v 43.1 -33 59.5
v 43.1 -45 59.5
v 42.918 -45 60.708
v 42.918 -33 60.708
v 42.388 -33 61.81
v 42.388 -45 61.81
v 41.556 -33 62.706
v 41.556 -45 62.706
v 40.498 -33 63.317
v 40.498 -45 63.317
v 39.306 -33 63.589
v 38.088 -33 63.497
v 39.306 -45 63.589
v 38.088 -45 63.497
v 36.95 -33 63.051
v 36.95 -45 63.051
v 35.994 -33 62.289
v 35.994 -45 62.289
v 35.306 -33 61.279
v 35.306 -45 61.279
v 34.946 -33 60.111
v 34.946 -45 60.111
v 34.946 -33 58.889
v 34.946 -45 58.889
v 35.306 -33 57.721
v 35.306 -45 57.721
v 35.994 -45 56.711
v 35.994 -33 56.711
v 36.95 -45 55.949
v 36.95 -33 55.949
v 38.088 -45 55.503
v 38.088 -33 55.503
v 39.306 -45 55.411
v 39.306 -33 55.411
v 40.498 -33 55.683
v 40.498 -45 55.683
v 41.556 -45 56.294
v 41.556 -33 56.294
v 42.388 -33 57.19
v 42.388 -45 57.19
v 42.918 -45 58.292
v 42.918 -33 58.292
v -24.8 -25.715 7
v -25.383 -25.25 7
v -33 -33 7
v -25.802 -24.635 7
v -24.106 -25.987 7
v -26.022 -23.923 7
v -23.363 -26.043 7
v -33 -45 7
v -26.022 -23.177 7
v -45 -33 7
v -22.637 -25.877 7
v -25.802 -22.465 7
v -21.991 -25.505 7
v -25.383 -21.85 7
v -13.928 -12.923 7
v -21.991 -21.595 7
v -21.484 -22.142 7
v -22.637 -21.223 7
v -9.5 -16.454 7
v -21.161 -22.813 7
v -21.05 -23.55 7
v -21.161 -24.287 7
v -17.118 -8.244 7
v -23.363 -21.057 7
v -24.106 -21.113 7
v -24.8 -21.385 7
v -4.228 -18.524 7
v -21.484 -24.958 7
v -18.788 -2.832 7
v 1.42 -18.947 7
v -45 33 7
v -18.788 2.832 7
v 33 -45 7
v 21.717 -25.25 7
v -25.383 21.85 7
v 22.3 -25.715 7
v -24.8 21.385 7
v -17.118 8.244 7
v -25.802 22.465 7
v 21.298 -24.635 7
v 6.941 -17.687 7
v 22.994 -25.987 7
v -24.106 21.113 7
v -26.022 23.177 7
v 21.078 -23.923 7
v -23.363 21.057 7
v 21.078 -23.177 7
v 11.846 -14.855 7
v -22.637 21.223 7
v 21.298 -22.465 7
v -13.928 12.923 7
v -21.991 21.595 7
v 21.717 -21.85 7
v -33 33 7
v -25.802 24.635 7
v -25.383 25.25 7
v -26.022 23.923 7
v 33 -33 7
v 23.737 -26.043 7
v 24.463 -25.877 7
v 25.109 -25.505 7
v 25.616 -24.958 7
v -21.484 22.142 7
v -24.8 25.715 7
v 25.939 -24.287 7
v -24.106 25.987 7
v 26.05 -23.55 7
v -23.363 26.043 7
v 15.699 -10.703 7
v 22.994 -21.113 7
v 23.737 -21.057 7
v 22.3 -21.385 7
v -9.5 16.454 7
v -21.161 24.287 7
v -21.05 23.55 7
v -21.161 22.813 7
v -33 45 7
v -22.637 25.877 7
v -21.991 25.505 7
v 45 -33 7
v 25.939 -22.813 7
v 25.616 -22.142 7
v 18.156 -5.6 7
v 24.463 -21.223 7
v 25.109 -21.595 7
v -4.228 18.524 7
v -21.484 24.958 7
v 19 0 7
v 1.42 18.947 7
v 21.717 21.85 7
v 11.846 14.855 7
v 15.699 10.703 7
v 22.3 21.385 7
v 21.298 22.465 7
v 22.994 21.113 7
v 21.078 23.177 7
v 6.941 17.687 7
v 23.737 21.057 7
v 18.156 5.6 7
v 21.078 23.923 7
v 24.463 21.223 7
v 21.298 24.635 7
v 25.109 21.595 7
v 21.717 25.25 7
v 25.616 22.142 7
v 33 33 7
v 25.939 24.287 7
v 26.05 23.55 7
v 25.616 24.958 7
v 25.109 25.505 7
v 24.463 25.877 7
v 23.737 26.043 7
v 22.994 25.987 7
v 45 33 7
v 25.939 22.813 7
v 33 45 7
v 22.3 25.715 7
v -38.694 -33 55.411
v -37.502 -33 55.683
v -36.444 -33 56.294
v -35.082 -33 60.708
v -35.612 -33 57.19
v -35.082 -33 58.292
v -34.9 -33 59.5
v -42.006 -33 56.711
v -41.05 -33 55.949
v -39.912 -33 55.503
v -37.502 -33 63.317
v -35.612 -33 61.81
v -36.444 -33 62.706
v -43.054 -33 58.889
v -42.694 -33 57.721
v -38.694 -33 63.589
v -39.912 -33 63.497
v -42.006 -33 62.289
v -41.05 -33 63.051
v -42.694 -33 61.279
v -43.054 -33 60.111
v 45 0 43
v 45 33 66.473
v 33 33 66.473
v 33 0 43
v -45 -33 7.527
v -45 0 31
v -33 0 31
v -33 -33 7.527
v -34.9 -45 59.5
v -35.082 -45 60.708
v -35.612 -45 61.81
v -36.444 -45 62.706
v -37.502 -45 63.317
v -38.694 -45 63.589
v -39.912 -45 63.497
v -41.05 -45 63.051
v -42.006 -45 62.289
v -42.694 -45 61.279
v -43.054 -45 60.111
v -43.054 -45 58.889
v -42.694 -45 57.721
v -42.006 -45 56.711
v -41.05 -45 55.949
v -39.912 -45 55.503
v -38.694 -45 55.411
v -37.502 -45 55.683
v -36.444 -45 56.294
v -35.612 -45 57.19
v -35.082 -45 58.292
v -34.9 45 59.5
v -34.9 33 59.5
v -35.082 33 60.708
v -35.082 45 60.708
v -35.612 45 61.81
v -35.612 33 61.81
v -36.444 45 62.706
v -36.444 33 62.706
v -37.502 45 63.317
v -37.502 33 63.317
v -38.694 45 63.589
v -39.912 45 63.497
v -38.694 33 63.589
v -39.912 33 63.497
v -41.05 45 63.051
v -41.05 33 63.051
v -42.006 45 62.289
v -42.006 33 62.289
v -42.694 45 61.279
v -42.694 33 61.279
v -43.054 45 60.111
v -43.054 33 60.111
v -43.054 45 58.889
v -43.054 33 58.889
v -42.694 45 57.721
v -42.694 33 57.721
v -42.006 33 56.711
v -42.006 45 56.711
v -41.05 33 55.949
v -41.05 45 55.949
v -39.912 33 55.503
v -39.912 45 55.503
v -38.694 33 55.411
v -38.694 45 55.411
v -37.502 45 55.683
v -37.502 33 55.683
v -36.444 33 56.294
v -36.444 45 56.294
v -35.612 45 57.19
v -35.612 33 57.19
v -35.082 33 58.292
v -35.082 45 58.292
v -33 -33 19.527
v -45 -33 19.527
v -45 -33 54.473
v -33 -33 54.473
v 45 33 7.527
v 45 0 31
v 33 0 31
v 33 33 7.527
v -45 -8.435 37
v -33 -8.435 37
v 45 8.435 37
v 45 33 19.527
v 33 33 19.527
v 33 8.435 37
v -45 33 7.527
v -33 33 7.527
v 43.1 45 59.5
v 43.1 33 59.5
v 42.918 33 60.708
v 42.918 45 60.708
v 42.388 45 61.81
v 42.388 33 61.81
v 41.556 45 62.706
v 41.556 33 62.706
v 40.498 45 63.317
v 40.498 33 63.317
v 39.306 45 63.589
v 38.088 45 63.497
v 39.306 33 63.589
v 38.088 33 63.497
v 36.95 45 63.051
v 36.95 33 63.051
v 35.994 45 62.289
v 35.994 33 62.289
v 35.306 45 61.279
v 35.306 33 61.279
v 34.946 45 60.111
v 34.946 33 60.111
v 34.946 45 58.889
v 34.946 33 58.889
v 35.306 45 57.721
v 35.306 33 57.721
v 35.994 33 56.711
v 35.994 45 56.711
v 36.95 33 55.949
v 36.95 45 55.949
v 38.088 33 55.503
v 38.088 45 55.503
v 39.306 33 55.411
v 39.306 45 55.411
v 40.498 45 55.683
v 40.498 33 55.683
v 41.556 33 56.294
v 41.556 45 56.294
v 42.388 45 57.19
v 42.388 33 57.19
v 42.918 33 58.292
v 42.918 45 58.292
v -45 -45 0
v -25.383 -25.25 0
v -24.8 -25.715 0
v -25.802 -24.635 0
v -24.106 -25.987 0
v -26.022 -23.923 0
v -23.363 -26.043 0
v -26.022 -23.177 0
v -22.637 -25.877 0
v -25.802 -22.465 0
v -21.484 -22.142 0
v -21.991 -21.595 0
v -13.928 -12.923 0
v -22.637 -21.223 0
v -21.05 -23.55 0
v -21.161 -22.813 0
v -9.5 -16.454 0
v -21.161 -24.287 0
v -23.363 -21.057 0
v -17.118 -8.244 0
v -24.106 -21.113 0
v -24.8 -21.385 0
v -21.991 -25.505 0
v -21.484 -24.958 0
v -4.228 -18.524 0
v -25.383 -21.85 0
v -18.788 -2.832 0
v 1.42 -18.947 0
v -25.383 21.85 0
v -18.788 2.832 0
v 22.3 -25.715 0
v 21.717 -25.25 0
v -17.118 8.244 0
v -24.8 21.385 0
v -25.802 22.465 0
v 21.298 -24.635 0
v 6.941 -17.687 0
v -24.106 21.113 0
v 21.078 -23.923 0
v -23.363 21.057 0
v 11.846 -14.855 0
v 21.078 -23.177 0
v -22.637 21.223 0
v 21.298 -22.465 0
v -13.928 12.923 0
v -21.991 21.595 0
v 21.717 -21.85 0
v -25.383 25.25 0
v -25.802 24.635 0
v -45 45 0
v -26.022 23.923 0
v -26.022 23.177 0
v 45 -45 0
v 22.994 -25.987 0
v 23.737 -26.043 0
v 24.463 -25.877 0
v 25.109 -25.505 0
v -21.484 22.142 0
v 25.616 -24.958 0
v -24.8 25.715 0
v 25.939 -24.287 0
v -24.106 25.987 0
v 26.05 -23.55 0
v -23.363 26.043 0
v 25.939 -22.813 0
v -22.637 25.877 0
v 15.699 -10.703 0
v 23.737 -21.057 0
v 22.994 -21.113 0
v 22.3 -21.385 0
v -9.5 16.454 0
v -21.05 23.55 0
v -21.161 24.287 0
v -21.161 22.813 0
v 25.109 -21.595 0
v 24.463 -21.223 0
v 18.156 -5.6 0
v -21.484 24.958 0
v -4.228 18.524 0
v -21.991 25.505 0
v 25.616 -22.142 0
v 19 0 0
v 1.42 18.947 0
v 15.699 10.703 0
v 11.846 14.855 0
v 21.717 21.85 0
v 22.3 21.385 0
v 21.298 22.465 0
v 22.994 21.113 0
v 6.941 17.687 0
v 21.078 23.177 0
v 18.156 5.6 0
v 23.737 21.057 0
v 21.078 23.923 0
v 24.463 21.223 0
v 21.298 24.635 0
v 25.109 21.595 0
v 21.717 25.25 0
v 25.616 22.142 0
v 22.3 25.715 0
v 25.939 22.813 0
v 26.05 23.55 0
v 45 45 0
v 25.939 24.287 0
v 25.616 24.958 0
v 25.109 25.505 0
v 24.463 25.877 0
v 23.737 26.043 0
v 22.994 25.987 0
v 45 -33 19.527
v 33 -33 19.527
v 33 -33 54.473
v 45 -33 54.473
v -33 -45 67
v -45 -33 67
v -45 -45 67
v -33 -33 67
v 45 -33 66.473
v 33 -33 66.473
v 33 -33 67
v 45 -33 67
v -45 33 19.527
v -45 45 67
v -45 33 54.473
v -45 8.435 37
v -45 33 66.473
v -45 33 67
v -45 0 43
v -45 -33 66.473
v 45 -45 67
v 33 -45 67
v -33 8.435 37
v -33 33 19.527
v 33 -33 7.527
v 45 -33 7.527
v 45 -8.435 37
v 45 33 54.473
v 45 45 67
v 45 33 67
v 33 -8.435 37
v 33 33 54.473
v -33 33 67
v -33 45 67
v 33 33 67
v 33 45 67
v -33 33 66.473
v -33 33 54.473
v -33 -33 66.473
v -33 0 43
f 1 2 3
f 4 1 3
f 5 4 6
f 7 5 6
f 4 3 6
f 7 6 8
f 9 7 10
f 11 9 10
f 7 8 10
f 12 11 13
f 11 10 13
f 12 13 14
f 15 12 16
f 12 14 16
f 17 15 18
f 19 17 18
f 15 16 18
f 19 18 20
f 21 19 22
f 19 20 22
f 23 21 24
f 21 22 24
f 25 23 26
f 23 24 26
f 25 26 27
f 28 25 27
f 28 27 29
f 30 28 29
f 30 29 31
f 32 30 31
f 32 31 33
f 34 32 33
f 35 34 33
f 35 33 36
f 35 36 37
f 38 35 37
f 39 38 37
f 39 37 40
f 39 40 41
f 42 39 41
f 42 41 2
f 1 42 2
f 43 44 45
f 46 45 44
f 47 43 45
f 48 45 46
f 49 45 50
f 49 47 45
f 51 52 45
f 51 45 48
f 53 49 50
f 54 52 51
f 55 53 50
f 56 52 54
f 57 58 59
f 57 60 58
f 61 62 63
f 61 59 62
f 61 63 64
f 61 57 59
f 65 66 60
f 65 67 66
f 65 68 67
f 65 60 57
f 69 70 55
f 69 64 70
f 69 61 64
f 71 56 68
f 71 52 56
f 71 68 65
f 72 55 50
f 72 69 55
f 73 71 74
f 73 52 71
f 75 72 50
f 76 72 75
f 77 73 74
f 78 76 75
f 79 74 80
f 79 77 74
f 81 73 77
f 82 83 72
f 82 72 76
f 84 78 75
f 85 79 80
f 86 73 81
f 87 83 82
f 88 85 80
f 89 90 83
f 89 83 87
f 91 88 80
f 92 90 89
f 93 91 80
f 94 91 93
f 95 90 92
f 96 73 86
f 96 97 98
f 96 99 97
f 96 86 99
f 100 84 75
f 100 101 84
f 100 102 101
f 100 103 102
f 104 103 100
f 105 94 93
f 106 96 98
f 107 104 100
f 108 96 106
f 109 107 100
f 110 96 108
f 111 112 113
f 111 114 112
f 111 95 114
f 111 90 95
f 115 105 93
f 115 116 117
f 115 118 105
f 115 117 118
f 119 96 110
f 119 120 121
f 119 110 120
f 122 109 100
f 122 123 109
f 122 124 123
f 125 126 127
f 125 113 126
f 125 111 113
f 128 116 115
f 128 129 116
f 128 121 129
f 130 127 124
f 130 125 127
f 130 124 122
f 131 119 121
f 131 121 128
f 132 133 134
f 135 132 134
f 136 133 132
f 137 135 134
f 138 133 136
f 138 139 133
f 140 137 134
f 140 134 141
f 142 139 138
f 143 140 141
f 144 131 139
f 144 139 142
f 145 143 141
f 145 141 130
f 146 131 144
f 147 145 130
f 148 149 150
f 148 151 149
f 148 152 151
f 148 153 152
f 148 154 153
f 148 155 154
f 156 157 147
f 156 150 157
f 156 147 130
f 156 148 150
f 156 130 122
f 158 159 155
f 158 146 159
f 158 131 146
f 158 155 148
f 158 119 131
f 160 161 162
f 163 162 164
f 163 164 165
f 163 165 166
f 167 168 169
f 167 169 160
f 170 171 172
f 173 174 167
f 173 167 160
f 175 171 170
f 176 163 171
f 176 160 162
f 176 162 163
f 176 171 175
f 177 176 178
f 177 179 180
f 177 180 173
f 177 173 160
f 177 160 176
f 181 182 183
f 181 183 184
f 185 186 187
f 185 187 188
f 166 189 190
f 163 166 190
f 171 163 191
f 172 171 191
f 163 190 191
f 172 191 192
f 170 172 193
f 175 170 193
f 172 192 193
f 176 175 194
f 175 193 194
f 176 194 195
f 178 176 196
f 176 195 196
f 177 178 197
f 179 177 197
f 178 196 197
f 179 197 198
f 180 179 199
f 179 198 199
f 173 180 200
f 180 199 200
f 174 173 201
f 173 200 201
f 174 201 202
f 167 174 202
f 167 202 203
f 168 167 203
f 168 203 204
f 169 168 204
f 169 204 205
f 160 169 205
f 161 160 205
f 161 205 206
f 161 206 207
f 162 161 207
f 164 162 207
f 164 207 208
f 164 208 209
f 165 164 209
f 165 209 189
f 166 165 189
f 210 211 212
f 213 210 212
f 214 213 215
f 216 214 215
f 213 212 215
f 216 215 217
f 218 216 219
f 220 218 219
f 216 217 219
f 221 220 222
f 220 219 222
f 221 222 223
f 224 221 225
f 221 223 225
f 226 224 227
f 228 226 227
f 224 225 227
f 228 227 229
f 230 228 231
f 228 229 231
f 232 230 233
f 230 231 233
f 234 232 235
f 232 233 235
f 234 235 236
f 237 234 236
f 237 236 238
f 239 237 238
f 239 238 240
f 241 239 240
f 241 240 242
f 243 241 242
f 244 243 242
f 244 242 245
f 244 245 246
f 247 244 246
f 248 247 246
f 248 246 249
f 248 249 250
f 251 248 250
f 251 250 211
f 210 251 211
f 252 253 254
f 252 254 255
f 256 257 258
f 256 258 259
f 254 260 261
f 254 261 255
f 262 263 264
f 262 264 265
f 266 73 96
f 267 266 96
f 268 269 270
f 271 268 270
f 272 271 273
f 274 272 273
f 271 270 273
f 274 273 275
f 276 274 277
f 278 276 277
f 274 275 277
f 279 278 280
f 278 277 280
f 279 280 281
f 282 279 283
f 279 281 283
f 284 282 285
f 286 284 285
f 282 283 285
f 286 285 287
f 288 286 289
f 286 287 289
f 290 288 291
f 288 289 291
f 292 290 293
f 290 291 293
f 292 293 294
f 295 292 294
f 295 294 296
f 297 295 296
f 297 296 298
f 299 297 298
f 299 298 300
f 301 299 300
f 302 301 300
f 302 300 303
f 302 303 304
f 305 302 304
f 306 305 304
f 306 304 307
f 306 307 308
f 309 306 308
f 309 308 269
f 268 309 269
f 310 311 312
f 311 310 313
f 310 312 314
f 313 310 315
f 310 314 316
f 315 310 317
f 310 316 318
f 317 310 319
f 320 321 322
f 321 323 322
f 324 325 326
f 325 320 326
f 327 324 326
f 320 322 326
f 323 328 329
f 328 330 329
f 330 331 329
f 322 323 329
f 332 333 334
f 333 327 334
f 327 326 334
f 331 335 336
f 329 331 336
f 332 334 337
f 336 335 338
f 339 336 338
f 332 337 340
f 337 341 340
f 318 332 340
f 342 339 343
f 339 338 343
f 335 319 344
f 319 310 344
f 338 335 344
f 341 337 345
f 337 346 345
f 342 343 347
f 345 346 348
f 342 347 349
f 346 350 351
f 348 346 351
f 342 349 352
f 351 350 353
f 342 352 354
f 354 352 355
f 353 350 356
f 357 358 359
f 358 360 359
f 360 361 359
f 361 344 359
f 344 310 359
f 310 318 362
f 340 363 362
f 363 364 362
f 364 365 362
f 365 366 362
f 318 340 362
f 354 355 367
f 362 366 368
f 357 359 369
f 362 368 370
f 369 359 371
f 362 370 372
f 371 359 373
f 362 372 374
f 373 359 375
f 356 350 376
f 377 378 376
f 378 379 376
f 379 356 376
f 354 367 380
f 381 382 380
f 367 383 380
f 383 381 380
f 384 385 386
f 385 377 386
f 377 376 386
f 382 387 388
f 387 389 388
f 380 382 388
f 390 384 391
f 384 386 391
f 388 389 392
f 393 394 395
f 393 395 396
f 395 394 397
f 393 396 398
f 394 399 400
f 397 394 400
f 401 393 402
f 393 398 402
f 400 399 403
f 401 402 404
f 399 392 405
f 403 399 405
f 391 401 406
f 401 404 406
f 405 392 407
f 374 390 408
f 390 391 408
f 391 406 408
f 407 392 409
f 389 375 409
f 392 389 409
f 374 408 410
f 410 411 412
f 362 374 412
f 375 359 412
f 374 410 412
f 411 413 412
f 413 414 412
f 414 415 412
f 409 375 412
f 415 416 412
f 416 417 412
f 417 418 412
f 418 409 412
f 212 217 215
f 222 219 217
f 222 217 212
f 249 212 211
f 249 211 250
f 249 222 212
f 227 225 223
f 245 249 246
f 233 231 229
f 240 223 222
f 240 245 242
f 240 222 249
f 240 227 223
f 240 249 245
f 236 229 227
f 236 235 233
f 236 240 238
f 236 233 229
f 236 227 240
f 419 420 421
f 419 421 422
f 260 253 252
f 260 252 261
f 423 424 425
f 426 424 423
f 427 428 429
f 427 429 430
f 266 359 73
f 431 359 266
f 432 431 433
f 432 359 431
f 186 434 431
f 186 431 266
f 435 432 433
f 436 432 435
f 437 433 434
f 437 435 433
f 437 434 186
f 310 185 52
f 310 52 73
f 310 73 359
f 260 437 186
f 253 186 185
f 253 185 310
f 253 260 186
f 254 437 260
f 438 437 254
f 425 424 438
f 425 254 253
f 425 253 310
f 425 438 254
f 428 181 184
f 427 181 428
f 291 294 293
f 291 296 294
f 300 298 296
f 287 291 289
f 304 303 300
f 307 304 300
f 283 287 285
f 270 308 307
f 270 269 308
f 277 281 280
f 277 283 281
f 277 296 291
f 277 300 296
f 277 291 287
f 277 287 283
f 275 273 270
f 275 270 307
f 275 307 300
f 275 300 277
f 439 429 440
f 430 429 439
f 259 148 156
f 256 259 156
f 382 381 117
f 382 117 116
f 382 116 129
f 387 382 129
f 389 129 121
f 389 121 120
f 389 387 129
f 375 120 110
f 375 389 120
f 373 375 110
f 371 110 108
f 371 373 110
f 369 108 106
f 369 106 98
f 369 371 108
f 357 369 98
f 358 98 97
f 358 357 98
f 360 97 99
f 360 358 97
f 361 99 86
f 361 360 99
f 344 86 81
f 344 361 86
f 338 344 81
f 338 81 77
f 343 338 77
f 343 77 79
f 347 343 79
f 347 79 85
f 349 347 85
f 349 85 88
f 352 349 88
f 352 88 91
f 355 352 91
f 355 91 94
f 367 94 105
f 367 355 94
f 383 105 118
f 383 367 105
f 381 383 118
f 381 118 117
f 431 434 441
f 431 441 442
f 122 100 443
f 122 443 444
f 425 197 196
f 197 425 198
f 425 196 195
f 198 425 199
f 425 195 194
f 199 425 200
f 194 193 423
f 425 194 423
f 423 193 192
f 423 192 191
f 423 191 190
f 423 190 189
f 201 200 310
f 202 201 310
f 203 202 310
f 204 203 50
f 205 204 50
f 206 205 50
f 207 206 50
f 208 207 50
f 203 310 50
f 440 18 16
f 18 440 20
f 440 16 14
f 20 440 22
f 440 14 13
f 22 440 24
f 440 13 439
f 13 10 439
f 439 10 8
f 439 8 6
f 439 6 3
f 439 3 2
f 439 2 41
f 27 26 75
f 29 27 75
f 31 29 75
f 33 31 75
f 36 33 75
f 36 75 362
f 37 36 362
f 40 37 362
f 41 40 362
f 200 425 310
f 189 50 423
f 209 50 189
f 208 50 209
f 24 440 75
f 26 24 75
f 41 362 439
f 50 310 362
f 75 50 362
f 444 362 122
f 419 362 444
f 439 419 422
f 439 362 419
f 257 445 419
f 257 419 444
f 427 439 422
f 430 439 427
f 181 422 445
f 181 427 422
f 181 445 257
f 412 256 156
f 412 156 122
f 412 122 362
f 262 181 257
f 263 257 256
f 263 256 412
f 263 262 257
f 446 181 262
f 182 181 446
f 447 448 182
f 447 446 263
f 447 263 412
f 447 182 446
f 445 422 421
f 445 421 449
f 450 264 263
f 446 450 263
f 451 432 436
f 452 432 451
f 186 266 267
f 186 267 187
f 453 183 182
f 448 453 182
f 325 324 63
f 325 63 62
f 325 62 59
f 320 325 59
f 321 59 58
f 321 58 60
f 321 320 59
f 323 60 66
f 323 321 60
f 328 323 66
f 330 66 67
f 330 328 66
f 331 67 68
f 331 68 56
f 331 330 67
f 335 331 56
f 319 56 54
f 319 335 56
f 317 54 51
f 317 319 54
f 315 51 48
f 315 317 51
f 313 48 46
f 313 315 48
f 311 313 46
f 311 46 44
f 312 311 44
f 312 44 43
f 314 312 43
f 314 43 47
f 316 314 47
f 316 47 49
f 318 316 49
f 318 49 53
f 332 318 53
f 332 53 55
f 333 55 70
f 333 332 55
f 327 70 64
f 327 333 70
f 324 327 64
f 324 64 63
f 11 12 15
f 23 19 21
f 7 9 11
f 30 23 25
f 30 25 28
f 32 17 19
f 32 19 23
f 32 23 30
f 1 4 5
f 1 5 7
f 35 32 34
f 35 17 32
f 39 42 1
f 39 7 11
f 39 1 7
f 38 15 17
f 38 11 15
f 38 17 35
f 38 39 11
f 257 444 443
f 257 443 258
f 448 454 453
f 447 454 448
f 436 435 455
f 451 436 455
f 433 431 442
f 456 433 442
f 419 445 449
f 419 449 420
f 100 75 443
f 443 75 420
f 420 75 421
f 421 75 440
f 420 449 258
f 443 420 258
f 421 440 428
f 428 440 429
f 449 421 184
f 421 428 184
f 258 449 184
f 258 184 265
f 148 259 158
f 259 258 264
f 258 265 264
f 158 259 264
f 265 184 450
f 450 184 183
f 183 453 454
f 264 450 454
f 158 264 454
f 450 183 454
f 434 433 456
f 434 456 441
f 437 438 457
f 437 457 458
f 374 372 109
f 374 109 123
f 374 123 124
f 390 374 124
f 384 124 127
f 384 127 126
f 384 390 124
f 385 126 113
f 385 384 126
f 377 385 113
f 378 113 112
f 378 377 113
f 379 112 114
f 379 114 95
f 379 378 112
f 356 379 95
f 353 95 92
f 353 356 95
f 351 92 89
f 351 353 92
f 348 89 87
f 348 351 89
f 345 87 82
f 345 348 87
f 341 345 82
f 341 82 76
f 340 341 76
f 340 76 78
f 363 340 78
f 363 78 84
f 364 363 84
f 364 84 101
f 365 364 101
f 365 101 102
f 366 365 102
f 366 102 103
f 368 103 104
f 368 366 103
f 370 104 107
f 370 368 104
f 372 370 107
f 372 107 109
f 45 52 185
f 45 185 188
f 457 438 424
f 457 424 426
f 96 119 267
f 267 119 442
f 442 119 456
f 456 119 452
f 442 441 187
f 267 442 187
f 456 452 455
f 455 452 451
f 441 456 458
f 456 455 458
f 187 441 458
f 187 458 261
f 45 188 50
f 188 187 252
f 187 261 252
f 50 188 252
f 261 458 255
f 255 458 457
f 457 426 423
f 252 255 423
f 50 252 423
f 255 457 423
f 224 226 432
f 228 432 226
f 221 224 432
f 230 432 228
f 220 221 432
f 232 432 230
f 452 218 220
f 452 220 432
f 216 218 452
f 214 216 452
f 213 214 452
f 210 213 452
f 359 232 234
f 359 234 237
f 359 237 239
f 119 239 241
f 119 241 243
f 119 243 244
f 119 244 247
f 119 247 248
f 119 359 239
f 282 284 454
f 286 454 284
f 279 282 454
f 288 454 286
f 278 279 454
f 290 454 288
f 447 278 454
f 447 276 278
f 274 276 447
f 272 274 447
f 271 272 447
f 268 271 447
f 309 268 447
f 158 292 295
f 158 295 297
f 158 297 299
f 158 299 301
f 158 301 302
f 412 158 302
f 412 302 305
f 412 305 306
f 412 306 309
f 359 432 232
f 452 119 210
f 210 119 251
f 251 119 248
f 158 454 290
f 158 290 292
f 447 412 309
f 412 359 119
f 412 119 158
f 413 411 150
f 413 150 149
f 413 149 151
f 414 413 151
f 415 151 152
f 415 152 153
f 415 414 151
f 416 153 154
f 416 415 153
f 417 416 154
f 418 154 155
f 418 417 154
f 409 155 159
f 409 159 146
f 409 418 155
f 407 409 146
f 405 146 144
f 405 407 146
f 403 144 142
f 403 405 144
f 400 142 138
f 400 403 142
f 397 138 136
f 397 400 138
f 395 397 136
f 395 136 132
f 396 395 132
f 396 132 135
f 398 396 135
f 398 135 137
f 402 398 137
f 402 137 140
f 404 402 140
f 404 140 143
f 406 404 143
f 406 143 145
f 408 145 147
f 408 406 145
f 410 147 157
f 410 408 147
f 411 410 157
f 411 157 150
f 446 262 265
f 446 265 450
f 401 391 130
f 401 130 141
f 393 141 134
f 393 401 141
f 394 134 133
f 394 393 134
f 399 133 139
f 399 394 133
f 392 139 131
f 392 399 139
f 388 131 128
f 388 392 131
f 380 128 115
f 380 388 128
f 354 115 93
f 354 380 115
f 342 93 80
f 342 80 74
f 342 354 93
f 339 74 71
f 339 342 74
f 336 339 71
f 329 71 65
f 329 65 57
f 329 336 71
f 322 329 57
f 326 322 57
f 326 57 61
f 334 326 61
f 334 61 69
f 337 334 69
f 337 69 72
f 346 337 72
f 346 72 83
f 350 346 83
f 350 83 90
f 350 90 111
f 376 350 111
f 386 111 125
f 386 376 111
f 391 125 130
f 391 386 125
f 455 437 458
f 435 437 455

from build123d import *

# Parameters (mm, degrees)
F0_W      = 90
F0_H      = 90
F0_R      = 2.5
F0_R_2    = 19
F1_DEPTH  = 7
F3_W      = 12
F3_H      = 12
F4_DEPTH  = 60
F6_R      = 4.1
F7_DEPTH  = 100
F8_DEPTH  = 25
F12_DEPTH = 12
F15_DEPTH = 12


with BuildPart() as f1:
    # F0 (on Top) → F1 (new body)
    with BuildSketch(Plane.XY):
        Rectangle(F0_W, F0_H)
        with Locations((-23.55, -23.55)):
            Circle(F0_R, mode=Mode.SUBTRACT)
        with Locations((23.55, -23.55)):
            Circle(F0_R, mode=Mode.SUBTRACT)
        with Locations((-23.55, 23.55)):
            Circle(F0_R, mode=Mode.SUBTRACT)
        Circle(F0_R_2, mode=Mode.SUBTRACT)
        with Locations((23.55, 23.55)):
            Circle(F0_R, mode=Mode.SUBTRACT)
    extrude(amount=F1_DEPTH)

    # F3 (on offset) → F4 (join)
    with BuildSketch(Plane.XY.offset(7)):
        with Locations((-39, 39)):
            Rectangle(F3_W, F3_H)
        with Locations((39, 39)):
            Rectangle(F3_W, F3_H)
        with Locations((39, -39)):
            Rectangle(F3_W, F3_H)
        with Locations((-39, -39)):
            Rectangle(F3_W, F3_H)
    extrude(amount=F4_DEPTH)

    # F6 (on offset) → F7 (cut)
    with BuildSketch(Plane.XZ.offset(45)):
        with Locations((-39, 59.5)):
            Circle(F6_R)
        with Locations((39, 59.5)):
            Circle(F6_R)
    extrude(amount=-F7_DEPTH, mode=Mode.SUBTRACT)

    # F0 (on Top) → F8 (cut)
    with BuildSketch(Plane.XY):
        Circle(F0_R_2)
        with Locations((-23.55, 23.55)):
            Circle(F0_R)
        with Locations((23.55, 23.55)):
            Circle(F0_R)
        with Locations((23.55, -23.55)):
            Circle(F0_R)
        with Locations((-23.55, -23.55)):
            Circle(F0_R)
    extrude(amount=-F8_DEPTH, mode=Mode.SUBTRACT)

    # F11 (on face) → F12 (join)
    with BuildSketch(Plane.YZ.offset(45)):
        Polygon((0, 43), (-33, 66.4730164111), (-33, 54.4730164111), (-8.4352175508, 37), align=None)
        Polygon((33, 66.4730164111), (0, 43), (8.4352175508, 37), (33, 54.4730164111), align=None)
        Polygon((33, 19.5269835889), (8.4352175508, 37), (0, 31), (33, 7.5269835889), align=None)
        Polygon((0, 31), (-8.4352175508, 37), (-33, 19.5269835889), (-33, 7.5269835889), align=None)
        Polygon((8.4352175508, 37), (0, 43), (-8.4352175508, 37), (0, 31), align=None)
    extrude(amount=-F12_DEPTH)

    # F14 (on offset) → F15 (join)
    with BuildSketch(Plane(origin=(-45, 0, 0), x_dir=(0, -1, 0), z_dir=(-1, 0, 0))):
        Polygon((0, 43), (-33, 66.4730164111), (-33, 54.4730164111), (-8.4352175508, 37), (-33, 19.5269835889), (-33, 7.5269835889), (0, 31), (33, 7.5269835889), (33, 19.5269835889), (8.4352175508, 37), (33, 54.4730164111), (33, 66.4730164111), align=None)
    extrude(amount=-F15_DEPTH)


solid = f1.part
